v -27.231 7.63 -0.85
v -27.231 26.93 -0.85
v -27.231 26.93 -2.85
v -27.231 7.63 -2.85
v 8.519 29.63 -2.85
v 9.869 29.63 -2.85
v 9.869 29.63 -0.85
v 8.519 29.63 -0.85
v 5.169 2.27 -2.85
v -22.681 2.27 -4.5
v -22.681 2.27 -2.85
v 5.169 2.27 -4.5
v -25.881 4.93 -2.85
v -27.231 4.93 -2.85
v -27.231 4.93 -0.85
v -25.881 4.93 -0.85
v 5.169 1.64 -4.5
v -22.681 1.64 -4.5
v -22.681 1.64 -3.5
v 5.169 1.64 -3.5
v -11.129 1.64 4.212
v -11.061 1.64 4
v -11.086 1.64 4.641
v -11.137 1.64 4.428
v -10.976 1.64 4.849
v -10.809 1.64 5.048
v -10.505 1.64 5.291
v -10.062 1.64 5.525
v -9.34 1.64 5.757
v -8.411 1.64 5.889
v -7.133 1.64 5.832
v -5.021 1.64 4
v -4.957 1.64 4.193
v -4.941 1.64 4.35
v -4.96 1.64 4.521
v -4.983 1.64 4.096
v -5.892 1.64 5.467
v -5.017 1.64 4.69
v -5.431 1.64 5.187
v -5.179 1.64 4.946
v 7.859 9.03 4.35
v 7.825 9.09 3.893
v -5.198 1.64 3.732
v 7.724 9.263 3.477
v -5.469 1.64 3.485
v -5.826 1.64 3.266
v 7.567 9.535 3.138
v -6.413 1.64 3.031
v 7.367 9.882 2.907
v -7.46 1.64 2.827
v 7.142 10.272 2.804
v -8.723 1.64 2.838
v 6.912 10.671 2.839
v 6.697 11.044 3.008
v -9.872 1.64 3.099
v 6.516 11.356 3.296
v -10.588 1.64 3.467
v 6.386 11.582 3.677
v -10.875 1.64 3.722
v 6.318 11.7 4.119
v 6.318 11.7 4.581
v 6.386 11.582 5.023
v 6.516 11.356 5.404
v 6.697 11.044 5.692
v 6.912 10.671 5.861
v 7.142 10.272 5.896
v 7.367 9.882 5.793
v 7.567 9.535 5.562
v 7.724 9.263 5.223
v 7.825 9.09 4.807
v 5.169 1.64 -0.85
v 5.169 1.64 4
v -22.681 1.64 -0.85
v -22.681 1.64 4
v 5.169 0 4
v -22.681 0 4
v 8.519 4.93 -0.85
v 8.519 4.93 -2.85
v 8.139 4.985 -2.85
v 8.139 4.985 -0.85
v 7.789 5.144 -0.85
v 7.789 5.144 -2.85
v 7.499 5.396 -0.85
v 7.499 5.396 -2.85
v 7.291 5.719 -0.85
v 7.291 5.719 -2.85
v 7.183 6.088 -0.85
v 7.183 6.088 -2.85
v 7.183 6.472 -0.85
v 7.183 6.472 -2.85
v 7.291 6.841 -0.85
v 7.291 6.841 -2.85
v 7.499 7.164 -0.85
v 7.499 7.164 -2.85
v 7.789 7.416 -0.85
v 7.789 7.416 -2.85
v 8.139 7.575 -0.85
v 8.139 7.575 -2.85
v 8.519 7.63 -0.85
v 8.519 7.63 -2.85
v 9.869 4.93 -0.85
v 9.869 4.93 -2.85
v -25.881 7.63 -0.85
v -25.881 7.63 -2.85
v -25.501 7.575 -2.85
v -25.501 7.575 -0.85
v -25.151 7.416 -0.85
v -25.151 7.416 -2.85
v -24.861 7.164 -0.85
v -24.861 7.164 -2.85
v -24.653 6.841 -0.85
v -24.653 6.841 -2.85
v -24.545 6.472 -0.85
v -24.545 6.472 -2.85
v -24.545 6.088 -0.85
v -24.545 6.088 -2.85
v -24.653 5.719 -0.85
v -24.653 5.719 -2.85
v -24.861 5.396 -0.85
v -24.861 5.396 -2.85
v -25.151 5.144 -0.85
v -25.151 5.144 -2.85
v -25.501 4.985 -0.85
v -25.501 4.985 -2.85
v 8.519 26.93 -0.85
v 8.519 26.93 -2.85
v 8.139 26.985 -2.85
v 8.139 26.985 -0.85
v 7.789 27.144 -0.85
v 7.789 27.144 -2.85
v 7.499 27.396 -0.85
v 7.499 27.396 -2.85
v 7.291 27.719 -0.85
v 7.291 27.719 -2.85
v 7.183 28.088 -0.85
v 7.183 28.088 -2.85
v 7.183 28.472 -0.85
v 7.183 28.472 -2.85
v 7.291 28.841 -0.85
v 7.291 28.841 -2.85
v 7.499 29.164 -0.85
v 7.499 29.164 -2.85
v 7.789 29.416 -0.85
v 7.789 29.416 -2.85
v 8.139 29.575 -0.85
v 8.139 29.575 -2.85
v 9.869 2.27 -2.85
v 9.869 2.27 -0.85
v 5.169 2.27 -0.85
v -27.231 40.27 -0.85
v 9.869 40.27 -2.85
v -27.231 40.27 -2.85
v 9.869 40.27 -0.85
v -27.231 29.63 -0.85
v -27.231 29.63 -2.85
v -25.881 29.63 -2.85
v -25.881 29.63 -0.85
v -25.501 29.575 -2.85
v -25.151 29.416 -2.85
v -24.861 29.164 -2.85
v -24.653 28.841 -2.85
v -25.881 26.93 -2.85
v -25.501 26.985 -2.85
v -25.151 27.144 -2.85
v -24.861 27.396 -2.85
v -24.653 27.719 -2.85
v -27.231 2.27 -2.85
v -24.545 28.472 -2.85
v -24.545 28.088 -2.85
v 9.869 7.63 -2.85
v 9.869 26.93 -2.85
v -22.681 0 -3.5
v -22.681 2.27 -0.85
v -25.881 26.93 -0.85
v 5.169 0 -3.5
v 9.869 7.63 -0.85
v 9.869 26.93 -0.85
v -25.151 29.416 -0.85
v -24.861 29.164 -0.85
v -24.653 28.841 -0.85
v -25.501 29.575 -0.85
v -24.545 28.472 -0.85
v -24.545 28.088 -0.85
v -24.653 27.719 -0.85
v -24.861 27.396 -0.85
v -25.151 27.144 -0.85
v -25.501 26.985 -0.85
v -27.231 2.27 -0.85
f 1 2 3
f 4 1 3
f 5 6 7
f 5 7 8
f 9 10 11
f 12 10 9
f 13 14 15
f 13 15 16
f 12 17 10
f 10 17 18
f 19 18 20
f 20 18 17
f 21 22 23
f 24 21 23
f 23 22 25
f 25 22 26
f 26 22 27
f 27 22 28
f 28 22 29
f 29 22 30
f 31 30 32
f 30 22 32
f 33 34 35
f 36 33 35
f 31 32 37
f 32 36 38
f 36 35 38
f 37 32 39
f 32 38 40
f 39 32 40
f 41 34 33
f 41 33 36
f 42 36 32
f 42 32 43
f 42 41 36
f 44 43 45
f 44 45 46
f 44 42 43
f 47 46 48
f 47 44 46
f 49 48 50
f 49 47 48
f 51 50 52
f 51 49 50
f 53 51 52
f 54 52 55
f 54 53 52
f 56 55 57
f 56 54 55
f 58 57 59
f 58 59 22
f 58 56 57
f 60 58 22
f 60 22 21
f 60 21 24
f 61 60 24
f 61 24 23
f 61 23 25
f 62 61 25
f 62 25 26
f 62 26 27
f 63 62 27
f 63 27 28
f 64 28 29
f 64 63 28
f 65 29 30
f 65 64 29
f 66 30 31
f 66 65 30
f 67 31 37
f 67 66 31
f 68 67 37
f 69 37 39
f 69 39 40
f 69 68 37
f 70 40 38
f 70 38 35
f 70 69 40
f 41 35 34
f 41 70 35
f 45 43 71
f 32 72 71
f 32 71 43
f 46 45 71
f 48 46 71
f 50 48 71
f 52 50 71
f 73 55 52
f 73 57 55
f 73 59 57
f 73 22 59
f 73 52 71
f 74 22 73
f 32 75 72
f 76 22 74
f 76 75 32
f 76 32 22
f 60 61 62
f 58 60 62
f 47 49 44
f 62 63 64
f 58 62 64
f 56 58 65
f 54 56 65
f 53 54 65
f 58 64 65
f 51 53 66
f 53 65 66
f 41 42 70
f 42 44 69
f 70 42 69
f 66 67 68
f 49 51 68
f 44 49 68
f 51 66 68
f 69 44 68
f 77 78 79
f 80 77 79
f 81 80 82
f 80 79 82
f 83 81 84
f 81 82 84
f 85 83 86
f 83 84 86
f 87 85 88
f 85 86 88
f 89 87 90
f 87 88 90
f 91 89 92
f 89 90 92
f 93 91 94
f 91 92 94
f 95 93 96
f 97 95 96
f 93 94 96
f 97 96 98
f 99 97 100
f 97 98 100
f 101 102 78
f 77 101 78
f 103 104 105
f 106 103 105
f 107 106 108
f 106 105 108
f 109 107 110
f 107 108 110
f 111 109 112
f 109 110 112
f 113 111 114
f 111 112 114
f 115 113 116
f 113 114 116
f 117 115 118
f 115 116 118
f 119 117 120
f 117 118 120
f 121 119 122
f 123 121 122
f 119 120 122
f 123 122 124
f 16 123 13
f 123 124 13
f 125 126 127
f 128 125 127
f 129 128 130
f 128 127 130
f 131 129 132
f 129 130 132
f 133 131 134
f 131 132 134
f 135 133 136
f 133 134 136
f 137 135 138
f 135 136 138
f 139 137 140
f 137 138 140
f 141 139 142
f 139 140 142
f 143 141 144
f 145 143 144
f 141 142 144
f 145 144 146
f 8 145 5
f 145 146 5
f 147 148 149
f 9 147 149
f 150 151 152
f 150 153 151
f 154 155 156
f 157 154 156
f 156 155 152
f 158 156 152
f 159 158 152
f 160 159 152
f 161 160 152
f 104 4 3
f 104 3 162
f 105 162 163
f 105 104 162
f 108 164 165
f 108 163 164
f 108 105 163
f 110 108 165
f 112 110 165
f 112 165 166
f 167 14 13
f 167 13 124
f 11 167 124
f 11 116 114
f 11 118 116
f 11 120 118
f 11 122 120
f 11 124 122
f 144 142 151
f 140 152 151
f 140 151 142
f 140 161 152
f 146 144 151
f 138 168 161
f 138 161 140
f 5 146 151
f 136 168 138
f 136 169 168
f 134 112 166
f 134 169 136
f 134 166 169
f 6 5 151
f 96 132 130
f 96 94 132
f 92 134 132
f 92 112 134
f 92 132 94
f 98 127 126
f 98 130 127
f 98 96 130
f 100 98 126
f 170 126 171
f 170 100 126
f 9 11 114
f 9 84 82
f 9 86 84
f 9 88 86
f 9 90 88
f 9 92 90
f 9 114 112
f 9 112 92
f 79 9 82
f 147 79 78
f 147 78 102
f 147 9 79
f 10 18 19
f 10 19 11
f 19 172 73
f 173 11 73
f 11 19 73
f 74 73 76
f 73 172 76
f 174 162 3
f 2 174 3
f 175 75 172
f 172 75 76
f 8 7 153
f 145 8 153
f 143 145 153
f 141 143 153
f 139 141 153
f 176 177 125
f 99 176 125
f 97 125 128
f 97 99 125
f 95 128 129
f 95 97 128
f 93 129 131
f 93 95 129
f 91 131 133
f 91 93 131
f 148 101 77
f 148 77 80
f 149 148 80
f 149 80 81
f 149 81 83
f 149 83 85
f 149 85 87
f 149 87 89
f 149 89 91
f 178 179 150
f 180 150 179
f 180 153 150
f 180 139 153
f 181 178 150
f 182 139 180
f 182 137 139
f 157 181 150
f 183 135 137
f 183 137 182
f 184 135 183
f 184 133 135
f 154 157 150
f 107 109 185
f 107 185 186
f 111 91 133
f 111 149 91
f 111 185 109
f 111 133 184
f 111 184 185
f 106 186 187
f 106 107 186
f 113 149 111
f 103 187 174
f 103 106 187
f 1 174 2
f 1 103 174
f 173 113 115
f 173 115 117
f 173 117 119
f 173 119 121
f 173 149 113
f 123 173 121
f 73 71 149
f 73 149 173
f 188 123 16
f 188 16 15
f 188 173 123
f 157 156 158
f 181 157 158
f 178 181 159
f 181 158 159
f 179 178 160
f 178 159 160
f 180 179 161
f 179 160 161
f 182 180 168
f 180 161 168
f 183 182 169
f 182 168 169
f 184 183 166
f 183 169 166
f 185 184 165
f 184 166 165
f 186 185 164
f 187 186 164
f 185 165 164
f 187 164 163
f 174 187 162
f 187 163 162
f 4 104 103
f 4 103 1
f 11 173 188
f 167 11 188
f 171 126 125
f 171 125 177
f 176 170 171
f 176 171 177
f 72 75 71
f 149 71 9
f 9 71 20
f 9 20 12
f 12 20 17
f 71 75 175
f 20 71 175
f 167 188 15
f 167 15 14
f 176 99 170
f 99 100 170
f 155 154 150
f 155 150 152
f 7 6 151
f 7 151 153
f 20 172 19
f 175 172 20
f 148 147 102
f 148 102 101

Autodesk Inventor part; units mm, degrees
ref_plane "XY Plane" through (0, 0, 0) normal (0, 0, 1) x (1, 0, 0)
sketch "Sketch1" plane through (0, 0, 0) normal (0, 1, 0) x (-1, 0, 0)
  line L0 (0, -0.13) -> (17.417, -0.13)
  line L1 (17.417, -0.13) -> (17.417, 0.13)
  line L2 (17.417, 0.13) -> (0, 0.13)
  line L3 (0, 0.13) -> (0, -0.13)
  line L4 (-17.289, 0) -> (34.651, 0) construction
  line L5 (22.681, -3.5) -> (-5.169, -3.5)
  line L6 (-5.169, -3.5) -> (-5.169, 4)
  line L7 (-5.169, 4) -> (22.681, 4)
  line L8 (22.681, 4) -> (22.681, -3.5)
  line L9 (27.231, -2.85) -> (-9.869, -2.85) construction
  line L10 (-9.869, -2.85) -> (-9.869, -0.85) construction
  line L11 (-9.869, -0.85) -> (27.231, -0.85) construction
  line L12 (27.231, -0.85) -> (27.231, -2.85) construction
  point P0 (0, 0)
  dimension "d1" = 17.417
  dimension "d2" = 0.26
  dimension "d7" = 7.5
  dimension "d8" = 27.85
  dimension "d9" = 0.85
  dimension "d10" = 2
  dimension "d11" = 9.814
  dimension "d12" = 37.1
  dimension "d13" = 4.55
  dimension "d20" = 4.85
ref_plane "Alu_Start_V" through (0, 2.27, 0) normal (0, 1, 0) x (-1, 0, 0)
sketch "Sketch2" plane through (0, 2.27, 0) normal (0, 1, 0) x (-1, 0, 0)
  line L0 (27.231, -2.85) -> (-9.869, -2.85) projected
  line L1 (27.231, -0.85) -> (27.231, -2.85) projected
  line L2 (-9.869, -0.85) -> (27.231, -0.85) projected
  line L3 (-9.869, -2.85) -> (-9.869, -0.85) projected
  point P0 (0, 0)
extrude "Extrusion2" add sketch "Sketch2" along normal blind 38
extrude "Extrusion3" add sketch "Sketch1" along normal blind 1.64 contours L3 L2 L1 L0 | L5 L6 L7 L8
sketch "Sketch3" plane through (0, 1.64, 0) normal (0, 1, 0) x (1, 0, 0)
  line L0 (5.169, 4.5) -> (-22.681, 4.5)
  line L1 (-22.681, 4.5) -> (-22.681, 0.85)
  line L2 (-22.681, 0.85) -> (5.169, 0.85)
  line L3 (5.169, 0.85) -> (5.169, 4.5)
  line L4 (9.869, 2.85) -> (-27.231, 2.85) construction
  line L5 (-27.231, 0.85) -> (9.869, 0.85) construction
  point P0 (0, 0)
  point P1 (-22.681, 3.5)
  point P2 (5.169, 3.5)
  point P3 (-22.681, 2.85)
  point P4 (5.169, 2.85)
  dimension "d22" = 3.65
extrude "Extrusion4" add sketch "Sketch3" along normal up to surface (0.63 mm away)
sketch "NozzleLine" plane through (0, 0, 0) normal (0, -1, 0) x (1, 0, 0)
  line L0 (0, 0) -> (-17.417, 0)
  point P0 (-17.417, 0.13)
  point P1 (-8.7085, 0)
sketch "Sketch5" plane through (9.869, 40.27, -2.85) normal (0, 0, -1) x (-1, 0, 0)
  line L0 (0, -38) -> (0, 0) projected
  line L1 (0, -10.64) -> (1.35, -10.64)
  arc A0 (1.35, -13.34) -> (1.35, -10.64) centre (1.35, -11.99) ccw
  line L2 (1.35, -13.34) -> (0, -13.34)
  line L3 (37.1, 0) -> (0, 0) construction
  line L4 (4.7, -38) -> (32.55, -38) construction
  line L5 (37.1, -38) -> (37.1, 0) construction
  line L6 (18.55, 0) -> (18.55, -38) construction
  line L7 (37.1, -10.64) -> (35.75, -10.64)
  arc A1 (35.75, -10.64) -> (35.75, -13.34) centre (35.75, -11.99) ccw
  line L8 (35.75, -13.34) -> (37.1, -13.34)
  line L9 (0, -22.99) -> (36.8238, -22.99) construction
  line L10 (0, -35.34) -> (1.35, -35.34)
  arc A2 (1.35, -35.34) -> (1.35, -32.64) centre (1.35, -33.99) ccw
  line L11 (1.35, -32.64) -> (0, -32.64)
  line L12 (37.1, -45.98) -> (0, -45.98) construction
  line L13 (37.1, -35.34) -> (35.75, -35.34)
  arc A3 (35.75, -32.64) -> (35.75, -35.34) centre (35.75, -33.99) ccw
  line L14 (35.75, -32.64) -> (37.1, -32.64)
  line L15 (37.1, -10.64) -> (37.1, -13.34)
  line L16 (37.1, -32.64) -> (37.1, -35.34)
  line L17 (-7.42, -38) -> (44.52, -38) projected
  point P0 (9.869, -40.27)
  point P1 (18.55, -45.98)
  point P2 (0, -32.64)
  point P3 (0, -35.34)
  dimension "d25" = 2.7
  dimension "d28" = 2.7
  dimension "d38" = 4.01
  dimension "d39" = 26.01
extrude "Extrusion5" cut sketch "Sketch5" against normal through all
ref_plane "NozzleLineCenter" through (-8.7085, 0, 0) normal (1, 0, 0) x (0, 1, 0)
sketch "Sketch6" plane through (-27.231, 40.27, -0.85) normal (0, 0, 1) x (1, 0, 0)
  line L0 (33.54, -28.5553) -> (35.09, -31.24)
  line L1 (4.55, -40.27) -> (32.4, -40.27) projected
  line L2 (37.1, -38) -> (37.1, -35.34) projected
  line L3 (32.4, -40.27) -> (4.55, -40.27) projected
  line L4 (37.1, -32.64) -> (37.1, -13.34) projected
  line L5 (-7.42, -38) -> (44.52, -38) projected
  line L6 (35.09, -31.24) -> (30.5153, -33.8812)
  point P0 (27.231, -40.27)
  dimension "d33" = 3.1
  dimension "d37" = 2.01
  dimension "d40" = 6.76
  dimension "d41" = 30
ref_plane "Work Plane3" through (6.309, 11.7147, -0.85) normal (-0.866, -0.5, 0) x (0.5, -0.866, 0)
sketch "Sketch7" plane through (6.309, 11.7147, -0.85) normal (-0.866, -0.5, 0) x (0.5, -0.866, 0)
  circle A0 centre (1.55, 5.2) radius 1.55
  line L0 (0, 0) -> (3.1, 0) construction
  line L1 (1.55, 5.2) -> (1.55, 0) construction
  point P0 (6.9907, 0.85)
  dimension "d43" = 3.1
  dimension "d45" = 5.2
extrude "Extrusion6" add sketch "Sketch7" along normal up to surface surface through (-8.756, 1.64, 0.25) normal (0, 1, 0)
properties part number "Xaar128"
